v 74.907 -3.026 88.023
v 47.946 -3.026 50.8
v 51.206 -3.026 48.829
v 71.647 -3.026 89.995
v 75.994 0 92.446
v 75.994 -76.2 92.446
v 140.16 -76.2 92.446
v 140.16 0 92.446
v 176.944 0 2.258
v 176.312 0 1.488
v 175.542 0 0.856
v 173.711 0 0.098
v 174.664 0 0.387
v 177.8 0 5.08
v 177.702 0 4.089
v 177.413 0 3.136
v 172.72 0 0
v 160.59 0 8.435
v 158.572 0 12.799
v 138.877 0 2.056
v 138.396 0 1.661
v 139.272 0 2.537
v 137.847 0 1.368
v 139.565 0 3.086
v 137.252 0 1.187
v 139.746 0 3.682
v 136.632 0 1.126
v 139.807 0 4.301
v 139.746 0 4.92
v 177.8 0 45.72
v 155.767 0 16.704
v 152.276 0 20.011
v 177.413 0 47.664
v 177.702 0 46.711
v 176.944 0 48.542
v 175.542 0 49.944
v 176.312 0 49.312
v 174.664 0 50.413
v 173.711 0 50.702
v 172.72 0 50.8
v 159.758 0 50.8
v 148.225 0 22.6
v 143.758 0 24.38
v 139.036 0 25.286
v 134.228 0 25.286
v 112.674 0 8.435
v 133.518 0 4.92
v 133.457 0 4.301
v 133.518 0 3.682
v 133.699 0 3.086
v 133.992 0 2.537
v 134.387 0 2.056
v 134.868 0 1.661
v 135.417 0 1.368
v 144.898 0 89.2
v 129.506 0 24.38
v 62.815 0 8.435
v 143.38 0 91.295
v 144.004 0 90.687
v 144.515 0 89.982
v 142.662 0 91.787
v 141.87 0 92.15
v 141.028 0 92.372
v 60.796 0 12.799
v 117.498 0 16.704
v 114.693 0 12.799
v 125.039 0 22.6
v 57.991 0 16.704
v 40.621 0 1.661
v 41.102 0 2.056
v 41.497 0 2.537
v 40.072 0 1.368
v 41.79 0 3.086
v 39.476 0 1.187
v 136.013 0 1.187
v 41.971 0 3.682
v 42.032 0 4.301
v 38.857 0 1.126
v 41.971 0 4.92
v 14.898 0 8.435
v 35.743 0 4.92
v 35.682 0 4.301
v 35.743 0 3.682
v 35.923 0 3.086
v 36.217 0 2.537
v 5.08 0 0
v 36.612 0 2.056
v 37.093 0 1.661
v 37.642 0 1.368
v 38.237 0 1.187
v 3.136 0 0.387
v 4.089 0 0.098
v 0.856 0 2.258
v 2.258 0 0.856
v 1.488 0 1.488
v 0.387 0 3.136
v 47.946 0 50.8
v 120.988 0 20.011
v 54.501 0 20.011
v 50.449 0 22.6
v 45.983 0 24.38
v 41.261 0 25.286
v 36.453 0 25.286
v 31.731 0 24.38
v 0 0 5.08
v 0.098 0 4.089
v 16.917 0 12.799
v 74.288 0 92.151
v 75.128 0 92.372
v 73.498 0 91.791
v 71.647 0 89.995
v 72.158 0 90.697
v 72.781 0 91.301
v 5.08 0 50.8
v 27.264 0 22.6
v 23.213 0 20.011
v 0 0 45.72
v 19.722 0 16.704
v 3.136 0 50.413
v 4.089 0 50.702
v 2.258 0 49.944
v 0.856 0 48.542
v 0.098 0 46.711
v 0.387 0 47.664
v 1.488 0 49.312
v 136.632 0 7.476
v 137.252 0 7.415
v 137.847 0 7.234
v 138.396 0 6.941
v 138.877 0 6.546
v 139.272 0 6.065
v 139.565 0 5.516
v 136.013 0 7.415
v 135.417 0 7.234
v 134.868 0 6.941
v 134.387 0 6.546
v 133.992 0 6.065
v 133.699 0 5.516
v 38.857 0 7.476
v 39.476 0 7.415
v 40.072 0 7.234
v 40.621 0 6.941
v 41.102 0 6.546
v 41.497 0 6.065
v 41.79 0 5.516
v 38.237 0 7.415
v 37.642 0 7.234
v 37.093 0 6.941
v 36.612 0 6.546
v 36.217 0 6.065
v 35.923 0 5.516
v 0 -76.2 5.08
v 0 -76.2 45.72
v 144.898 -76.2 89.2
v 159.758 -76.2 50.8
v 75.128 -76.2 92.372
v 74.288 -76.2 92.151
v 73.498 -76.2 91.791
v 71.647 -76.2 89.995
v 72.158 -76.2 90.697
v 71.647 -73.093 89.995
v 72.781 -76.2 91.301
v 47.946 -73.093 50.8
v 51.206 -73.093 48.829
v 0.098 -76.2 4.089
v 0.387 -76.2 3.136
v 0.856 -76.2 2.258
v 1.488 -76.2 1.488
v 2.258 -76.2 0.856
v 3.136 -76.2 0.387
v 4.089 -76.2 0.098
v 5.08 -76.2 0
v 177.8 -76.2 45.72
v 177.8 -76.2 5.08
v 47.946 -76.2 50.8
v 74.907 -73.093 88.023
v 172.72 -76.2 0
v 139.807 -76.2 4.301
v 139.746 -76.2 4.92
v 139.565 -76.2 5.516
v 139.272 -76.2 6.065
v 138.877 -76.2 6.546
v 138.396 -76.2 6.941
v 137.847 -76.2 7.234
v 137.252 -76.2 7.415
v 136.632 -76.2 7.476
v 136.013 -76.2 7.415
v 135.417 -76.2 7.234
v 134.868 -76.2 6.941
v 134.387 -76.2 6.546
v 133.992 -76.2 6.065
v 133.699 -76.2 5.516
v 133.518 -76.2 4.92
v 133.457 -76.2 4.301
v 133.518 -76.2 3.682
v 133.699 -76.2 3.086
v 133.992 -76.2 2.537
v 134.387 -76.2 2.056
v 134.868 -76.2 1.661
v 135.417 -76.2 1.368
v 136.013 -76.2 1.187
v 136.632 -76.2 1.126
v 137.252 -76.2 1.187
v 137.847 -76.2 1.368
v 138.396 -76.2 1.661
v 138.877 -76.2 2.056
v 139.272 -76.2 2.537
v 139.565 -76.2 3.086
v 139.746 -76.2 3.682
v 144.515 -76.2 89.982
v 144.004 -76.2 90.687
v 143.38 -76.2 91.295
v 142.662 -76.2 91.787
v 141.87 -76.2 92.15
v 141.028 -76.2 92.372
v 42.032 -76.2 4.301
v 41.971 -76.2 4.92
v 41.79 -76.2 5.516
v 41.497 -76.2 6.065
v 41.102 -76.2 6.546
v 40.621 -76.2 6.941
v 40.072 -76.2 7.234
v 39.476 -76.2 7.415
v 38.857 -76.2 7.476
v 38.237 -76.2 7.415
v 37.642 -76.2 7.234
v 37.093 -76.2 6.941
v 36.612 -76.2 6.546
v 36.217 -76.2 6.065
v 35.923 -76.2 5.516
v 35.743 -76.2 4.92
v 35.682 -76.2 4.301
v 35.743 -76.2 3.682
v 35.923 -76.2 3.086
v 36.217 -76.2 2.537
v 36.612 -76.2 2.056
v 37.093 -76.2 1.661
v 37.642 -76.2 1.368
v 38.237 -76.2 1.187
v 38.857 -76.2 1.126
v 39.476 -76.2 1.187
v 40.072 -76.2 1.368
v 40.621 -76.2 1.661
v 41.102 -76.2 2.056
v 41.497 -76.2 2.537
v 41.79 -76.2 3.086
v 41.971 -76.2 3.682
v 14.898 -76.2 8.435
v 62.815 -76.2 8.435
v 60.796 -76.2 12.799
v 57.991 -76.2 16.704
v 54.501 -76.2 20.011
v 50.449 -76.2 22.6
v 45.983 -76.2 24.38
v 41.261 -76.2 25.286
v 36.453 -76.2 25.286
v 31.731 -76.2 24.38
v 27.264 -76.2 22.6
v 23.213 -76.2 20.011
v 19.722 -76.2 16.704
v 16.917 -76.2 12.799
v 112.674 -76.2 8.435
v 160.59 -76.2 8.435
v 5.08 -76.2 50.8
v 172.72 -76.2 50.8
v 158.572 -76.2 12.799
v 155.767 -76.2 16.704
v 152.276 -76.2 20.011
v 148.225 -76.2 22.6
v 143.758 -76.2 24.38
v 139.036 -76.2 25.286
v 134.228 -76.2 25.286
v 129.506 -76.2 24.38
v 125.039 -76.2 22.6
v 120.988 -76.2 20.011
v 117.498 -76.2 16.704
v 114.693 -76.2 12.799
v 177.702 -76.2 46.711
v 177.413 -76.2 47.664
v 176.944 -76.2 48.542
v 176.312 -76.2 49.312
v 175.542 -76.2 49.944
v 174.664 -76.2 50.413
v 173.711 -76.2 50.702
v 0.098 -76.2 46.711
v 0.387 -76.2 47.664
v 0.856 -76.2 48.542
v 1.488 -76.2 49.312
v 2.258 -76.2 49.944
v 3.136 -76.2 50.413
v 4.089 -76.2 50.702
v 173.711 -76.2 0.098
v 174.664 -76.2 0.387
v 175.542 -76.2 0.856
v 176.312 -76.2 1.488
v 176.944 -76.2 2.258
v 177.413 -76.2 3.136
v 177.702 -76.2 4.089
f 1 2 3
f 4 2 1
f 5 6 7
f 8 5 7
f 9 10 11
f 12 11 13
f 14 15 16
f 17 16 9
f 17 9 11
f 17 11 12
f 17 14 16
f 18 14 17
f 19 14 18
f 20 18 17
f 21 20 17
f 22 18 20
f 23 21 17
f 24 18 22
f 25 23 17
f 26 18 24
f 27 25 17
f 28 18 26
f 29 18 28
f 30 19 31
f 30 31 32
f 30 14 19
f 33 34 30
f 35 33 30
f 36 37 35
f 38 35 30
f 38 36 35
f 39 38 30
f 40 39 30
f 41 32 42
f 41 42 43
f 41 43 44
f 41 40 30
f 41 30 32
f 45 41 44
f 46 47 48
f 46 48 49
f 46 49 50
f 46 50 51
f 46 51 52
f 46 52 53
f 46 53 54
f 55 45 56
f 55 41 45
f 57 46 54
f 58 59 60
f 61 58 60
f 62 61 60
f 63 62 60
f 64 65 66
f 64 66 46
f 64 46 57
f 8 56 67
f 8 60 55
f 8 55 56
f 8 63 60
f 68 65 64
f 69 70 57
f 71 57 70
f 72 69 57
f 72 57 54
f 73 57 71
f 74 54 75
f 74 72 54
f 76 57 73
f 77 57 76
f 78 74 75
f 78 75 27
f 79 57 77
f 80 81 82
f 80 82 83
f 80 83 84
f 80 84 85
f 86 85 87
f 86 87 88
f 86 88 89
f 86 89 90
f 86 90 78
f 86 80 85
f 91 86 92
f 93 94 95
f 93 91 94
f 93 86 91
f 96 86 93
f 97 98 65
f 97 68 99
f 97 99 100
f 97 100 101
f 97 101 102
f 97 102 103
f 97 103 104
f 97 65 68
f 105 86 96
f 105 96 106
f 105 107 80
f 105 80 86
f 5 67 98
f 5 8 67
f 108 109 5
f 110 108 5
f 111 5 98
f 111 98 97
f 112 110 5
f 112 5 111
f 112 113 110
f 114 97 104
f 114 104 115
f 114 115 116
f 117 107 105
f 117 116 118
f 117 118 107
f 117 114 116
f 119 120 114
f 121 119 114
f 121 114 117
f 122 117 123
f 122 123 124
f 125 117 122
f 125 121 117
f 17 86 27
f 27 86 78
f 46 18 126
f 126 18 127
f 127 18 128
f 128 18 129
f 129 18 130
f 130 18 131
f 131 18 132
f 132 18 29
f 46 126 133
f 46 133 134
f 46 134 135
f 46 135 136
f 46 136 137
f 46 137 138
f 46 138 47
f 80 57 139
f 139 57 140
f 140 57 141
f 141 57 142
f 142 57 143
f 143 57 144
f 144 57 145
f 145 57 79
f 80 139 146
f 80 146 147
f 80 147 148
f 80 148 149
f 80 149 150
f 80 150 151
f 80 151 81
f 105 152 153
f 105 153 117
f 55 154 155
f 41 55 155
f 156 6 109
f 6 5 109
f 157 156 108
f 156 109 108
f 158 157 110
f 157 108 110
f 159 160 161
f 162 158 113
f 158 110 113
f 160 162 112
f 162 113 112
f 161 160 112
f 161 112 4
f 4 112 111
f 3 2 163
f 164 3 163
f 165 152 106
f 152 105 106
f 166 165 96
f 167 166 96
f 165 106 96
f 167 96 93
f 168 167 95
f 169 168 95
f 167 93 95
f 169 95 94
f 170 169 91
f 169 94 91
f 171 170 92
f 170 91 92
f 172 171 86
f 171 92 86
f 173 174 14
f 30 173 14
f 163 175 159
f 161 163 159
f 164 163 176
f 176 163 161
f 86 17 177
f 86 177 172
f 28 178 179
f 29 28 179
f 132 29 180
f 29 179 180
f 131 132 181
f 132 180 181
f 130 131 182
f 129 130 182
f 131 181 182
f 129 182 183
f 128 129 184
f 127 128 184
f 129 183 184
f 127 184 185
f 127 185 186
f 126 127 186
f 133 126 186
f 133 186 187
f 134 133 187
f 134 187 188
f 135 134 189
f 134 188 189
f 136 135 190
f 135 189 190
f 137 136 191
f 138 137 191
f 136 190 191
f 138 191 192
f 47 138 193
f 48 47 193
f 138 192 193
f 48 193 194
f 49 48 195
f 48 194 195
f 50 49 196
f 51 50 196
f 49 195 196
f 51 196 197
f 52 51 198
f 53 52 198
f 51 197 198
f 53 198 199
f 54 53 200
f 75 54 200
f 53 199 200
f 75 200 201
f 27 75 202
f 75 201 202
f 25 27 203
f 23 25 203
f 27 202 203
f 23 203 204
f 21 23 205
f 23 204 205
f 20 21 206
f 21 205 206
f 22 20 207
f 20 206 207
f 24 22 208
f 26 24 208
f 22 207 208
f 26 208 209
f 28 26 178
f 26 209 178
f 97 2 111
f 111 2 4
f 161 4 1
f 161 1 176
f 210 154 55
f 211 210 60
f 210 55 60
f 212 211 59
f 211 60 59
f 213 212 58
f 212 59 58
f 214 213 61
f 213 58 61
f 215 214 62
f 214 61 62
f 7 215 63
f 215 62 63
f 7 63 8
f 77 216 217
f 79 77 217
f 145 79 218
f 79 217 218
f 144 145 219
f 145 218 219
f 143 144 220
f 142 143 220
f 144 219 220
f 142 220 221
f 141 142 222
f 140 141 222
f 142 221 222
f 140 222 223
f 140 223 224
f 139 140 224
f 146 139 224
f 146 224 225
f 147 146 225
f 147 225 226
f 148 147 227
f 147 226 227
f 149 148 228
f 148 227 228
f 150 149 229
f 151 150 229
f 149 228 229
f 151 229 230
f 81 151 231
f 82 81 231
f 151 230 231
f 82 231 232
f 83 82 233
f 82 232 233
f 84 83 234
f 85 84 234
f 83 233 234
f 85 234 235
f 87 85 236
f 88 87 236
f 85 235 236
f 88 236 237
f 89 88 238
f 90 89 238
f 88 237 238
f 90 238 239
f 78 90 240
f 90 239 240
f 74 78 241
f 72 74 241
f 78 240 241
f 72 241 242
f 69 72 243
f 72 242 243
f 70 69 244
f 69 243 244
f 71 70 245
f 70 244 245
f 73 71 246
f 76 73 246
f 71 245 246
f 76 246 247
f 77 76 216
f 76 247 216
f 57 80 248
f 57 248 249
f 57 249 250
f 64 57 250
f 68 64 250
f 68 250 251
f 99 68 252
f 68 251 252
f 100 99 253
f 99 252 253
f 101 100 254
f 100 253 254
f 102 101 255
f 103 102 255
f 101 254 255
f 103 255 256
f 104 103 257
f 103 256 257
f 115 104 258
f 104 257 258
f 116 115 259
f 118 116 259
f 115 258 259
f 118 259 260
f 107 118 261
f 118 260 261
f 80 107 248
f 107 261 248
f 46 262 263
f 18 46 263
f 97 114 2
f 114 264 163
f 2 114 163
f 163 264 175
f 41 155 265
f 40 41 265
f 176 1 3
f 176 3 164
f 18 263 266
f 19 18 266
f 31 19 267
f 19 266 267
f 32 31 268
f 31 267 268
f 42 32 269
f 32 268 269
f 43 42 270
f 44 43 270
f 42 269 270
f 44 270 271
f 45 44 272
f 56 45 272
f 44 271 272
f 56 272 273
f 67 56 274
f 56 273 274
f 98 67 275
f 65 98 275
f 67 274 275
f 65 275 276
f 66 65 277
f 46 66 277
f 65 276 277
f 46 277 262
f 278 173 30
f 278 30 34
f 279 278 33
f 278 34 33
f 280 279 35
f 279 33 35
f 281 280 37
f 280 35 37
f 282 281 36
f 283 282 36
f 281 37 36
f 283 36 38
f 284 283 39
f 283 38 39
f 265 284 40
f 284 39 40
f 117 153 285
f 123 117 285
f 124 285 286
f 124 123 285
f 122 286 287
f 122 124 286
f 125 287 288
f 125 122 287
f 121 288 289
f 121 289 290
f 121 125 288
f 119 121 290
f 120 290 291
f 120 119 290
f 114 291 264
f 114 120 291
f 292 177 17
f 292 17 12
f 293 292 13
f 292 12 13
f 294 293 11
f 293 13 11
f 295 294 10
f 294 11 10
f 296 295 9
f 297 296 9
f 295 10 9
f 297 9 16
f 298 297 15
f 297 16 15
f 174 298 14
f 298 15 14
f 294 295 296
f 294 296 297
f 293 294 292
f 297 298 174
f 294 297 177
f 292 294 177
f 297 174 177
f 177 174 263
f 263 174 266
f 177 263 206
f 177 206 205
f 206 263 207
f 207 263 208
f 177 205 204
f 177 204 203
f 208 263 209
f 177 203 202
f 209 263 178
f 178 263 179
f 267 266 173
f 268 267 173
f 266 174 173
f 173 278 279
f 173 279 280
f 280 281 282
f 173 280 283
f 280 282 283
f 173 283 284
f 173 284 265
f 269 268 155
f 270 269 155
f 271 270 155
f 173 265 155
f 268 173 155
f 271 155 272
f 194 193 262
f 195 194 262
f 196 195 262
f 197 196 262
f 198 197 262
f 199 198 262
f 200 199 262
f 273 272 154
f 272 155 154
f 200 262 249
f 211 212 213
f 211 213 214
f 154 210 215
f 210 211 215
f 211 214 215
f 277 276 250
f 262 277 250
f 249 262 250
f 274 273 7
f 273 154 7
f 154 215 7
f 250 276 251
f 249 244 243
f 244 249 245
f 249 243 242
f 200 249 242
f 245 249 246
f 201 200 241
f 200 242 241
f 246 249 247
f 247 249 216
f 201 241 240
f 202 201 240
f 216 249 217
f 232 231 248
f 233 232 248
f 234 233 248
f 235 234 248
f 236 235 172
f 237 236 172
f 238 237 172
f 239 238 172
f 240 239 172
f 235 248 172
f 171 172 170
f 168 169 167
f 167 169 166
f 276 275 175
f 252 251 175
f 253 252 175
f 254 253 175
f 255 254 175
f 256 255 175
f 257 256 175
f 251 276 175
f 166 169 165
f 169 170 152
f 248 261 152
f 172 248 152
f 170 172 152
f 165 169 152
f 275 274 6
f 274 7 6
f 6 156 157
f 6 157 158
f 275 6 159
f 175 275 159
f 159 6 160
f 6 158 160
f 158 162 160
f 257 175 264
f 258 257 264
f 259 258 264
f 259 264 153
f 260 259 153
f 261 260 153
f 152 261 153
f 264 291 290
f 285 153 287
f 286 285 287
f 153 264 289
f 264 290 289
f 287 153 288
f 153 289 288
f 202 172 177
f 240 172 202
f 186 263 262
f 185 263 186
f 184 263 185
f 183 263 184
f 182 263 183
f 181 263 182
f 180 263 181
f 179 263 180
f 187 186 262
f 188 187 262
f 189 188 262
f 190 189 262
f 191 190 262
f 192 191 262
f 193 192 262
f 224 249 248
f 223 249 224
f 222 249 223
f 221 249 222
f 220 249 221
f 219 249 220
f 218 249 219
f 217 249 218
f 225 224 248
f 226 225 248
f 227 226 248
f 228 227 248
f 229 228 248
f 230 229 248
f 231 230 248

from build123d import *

# Parameters (mm, degrees)
F0_W      = 177.8
F0_H      = 76.2
F1_DEPTH  = 101.6
F3_DEPTH  = 203.2
F4_R      = 5.08
F5_W      = 70.067029912
F5_H      = 45.8034253509
F6_DEPTH  = 3.81
F8_DEPTH  = 203.2
F10_DEPTH = 76.2
F11_R     = 3.175
F12_DEPTH = 76.2


with BuildPart() as f1:
    # F0 (on Top) → F1 (new body)
    with BuildSketch(Plane.XY):
        with Locations((88.9, -38.1)):
            Rectangle(F0_W, F0_H)
    extrude(amount=F1_DEPTH)

    # F2 (on face) → F3 (cut)
    with BuildSketch(Plane.XZ.offset(76.2)):
        Polygon((0, 101.6), (0, 50.8), (47.9459241033, 50.8), (73.1289312243, 92.4461781979), (143.6413377523, 92.4461781979), (159.7584486008, 50.8), (177.8, 50.8), (177.8, 101.6), align=None)
    extrude(amount=-F3_DEPTH, mode=Mode.SUBTRACT)

    # F4
    f4_edges = [f1.edges().sort_by_distance(p)[0] for p in [
        (0, -38.1, 50.8),
        (73.128931, -38.1, 92.446178),
        (143.641338, -38.1, 92.446178),
        (177.8, -38.1, 50.8),
        (177.8, -38.1, 0),
        (0, -38.1, 0),
    ]]
    fillet(f4_edges, radius=F4_R)

    # F5 (on face) → F6 (cut)
    with BuildSketch(Plane(origin=(12.6150217606, 0, -7.6281713371), x_dir=(0, -1, 0), z_dir=(-0.8557174536, 0, 0.5174433684))):
        with Locations((38.0591393914, 91.1814597909)):
            Rectangle(F5_W, F5_H)
    extrude(amount=-F6_DEPTH, mode=Mode.SUBTRACT)

    # F7 (on face) → F8 (cut)
    with BuildSketch(Plane.XZ.offset(76.2)):
        with BuildLine():
            ThreePointArc((162.0320997477, 0), (136.6320997477, 25.4), (111.2320997477, 0))
            Line((111.2320997477, 0), (162.0320997477, 0))
        make_face()
        with BuildLine():
            Line((13.4567559421, 0), (64.2567559421, 0))
            ThreePointArc((64.2567559421, 0), (38.8567559421, 25.4), (13.4567559421, 0))
        make_face()
    extrude(amount=-F8_DEPTH, mode=Mode.SUBTRACT)

    # F9 (on face) → F10 (join)
    with BuildSketch(Plane(origin=(0, 0, 0), x_dir=(-1, 0, 0), z_dir=(0, 1, 0))):
        with BuildLine():
            ThreePointArc((-160.5904804881, 8.4354011342), (-161.6691010738, 4.2788508499), (-162.0320997477, 0))
            Line((-162.0320997477, 0), (-111.2320997477, 0))
            ThreePointArc((-111.2320997477, 0), (-111.5950984215, 4.2788508499), (-112.6737190072, 8.4354011342))
            Line((-112.6737190072, 8.4354011342), (-160.5904804881, 8.4354011342))
        make_face()
        with BuildLine():
            ThreePointArc((-62.8151366826, 8.4354011342), (-63.8937572682, 4.2788508499), (-64.2567559421, 0))
            Line((-64.2567559421, 0), (-13.4567559421, 0))
            ThreePointArc((-13.4567559421, 0), (-13.819754616, 4.2788508499), (-14.8983752016, 8.4354011342))
            Line((-14.8983752016, 8.4354011342), (-62.8151366826, 8.4354011342))
        make_face()
    extrude(amount=-F10_DEPTH)

    # F11 (on face) → F12 (cut)
    with BuildSketch(Plane.XZ.offset(76.2)):
        with Locations((38.8567559421, 4.3010804802)):
            Circle(F11_R)
        with Locations((136.6320997477, 4.3010804802)):
            Circle(F11_R)
    extrude(amount=-F12_DEPTH, mode=Mode.SUBTRACT)


solid = f1.part
